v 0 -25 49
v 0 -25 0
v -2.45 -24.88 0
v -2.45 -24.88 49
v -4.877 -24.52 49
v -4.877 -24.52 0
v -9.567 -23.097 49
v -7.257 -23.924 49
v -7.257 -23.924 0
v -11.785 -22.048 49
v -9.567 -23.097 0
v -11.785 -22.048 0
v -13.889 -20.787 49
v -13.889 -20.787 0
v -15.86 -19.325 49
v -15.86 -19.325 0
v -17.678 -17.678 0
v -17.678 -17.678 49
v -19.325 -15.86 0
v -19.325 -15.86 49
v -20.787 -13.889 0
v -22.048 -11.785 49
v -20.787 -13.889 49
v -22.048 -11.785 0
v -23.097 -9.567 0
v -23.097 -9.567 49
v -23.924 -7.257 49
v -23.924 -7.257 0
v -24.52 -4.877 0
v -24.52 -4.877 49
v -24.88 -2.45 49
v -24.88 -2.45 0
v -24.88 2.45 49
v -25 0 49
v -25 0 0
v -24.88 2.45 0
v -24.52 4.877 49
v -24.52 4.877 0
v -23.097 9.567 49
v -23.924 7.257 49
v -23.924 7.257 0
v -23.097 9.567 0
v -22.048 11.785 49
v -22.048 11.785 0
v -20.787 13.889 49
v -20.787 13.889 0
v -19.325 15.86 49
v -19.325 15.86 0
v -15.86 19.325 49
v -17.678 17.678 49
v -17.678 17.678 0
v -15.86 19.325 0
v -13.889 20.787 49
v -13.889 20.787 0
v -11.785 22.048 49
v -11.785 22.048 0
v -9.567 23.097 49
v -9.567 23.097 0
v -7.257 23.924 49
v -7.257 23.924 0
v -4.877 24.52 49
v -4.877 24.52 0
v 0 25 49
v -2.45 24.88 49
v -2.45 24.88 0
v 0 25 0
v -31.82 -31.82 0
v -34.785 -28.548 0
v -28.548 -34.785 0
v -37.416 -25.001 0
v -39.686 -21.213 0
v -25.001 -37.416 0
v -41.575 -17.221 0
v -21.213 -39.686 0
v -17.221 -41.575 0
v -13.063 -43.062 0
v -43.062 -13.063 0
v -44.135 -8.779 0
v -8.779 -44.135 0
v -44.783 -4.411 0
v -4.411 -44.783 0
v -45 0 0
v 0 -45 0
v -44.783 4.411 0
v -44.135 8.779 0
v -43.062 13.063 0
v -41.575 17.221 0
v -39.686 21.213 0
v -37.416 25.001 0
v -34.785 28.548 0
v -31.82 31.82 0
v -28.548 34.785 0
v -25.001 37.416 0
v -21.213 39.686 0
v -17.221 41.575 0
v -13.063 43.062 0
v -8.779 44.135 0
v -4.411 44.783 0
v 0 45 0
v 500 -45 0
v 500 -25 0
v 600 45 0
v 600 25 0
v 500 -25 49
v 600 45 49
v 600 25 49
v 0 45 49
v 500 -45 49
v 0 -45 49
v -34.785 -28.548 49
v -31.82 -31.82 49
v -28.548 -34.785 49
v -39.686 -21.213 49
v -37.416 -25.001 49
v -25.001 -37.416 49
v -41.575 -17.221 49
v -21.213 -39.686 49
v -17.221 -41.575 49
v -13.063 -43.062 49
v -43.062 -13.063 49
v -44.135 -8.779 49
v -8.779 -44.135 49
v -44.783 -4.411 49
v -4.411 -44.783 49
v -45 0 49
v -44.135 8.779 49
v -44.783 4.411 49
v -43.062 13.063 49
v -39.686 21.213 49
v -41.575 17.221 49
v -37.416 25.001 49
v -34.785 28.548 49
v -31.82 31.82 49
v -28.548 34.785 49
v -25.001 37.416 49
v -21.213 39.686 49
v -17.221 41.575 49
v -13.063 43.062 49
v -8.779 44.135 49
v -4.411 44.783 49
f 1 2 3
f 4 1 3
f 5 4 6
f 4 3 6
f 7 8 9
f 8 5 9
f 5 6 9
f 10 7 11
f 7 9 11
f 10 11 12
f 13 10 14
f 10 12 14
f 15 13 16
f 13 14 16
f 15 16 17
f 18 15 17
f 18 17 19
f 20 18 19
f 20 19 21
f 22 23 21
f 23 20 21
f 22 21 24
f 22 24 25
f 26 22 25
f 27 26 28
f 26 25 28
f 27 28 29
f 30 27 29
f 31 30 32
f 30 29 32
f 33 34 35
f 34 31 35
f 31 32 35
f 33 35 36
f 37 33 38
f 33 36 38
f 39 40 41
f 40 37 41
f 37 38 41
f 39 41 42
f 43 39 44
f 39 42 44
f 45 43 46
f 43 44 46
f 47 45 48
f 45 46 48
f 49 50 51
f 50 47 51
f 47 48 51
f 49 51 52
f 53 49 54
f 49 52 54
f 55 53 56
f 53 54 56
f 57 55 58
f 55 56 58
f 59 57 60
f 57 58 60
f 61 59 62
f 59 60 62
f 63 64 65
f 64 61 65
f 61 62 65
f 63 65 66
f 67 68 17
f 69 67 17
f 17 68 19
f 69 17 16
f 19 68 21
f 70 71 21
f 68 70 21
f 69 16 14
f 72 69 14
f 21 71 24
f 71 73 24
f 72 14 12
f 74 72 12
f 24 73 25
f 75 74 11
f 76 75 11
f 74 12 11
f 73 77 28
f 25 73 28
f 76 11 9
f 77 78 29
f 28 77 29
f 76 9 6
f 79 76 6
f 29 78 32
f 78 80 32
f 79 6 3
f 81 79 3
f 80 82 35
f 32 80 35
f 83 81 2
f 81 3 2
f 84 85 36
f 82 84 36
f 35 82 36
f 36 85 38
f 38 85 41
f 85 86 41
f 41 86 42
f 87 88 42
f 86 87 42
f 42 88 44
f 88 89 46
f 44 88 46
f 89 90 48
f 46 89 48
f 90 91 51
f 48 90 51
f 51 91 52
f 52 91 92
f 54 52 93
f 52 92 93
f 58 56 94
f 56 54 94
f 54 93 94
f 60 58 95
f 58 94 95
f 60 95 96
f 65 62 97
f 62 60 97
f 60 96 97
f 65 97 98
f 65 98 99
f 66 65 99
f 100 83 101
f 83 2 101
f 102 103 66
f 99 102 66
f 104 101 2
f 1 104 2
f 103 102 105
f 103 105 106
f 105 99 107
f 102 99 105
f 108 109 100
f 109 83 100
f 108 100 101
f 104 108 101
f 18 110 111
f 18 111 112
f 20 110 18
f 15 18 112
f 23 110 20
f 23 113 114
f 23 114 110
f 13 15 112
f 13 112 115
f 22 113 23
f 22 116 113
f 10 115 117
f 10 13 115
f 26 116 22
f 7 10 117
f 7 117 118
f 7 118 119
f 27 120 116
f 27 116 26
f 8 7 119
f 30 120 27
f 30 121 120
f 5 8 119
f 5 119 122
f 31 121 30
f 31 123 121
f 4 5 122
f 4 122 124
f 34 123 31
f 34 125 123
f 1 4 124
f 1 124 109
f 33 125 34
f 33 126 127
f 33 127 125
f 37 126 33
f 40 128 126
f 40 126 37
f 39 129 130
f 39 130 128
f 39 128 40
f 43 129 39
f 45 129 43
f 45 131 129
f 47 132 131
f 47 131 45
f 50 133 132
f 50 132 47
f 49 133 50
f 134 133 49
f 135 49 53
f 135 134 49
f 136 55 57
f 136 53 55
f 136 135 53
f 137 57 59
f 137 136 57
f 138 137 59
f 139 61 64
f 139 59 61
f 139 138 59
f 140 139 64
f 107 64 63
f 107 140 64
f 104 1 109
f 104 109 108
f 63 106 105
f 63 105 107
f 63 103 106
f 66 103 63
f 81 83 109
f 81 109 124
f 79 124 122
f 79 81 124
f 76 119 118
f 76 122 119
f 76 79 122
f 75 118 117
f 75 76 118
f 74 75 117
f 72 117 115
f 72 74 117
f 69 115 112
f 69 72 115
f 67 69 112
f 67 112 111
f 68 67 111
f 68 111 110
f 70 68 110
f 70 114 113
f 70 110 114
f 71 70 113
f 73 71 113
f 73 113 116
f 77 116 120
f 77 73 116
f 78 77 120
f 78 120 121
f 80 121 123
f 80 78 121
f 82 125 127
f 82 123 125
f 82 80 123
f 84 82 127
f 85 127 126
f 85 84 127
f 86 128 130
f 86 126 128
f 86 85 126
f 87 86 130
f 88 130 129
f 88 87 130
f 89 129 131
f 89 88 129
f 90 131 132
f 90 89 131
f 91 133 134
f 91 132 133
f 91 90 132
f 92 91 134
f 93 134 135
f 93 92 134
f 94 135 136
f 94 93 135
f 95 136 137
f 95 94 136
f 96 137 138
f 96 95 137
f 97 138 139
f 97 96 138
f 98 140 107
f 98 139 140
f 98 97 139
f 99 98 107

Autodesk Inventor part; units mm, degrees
ref_plane "YZ Plane" through (0, 0, 0) normal (1, 0, 0) x (0, 1, 0)
ref_plane "XZ Plane" through (0, 0, 0) normal (0, 1, 0) x (-1, 0, 0)
ref_plane "XY Plane" through (0, 0, 0) normal (0, 0, 1) x (1, 0, 0)
sketch "Sketch1" plane through (0, 0, 0) normal (0, 0, 1) x (1, 0, 0)
  circle A0 centre (0, 0) radius 45
  line L0 (0, -45) -> (500, -45)
  line L1 (500, -45) -> (500, -25)
  line L2 (500, -25) -> (0, -25)
  line L3 (0, -25) -> (0, -45)
  line L4 (0, 45) -> (600, 45)
  line L5 (600, 45) -> (600, 25)
  line L6 (600, 25) -> (0, 25)
  line L7 (0, 25) -> (0, 45)
  circle A1 centre (0, 0) radius 25
  point P0 (0, -25)
  point P1 (0, 25)
  dimension "d0" = 90
  dimension "d1" = 20
  dimension "d2" = 20
  dimension "d4" = 500
  dimension "d9" = 600
extrude "Extrusion1" add sketch "Sketch1" along normal blind 49 contours L7 A1 L3 A0 | L4 L5 L6 A0 | A0 L6 L7 | L3 L2 A0 | A0 L2 L1 L0
properties part number "J15BF.1.40_Xaxis_B"
